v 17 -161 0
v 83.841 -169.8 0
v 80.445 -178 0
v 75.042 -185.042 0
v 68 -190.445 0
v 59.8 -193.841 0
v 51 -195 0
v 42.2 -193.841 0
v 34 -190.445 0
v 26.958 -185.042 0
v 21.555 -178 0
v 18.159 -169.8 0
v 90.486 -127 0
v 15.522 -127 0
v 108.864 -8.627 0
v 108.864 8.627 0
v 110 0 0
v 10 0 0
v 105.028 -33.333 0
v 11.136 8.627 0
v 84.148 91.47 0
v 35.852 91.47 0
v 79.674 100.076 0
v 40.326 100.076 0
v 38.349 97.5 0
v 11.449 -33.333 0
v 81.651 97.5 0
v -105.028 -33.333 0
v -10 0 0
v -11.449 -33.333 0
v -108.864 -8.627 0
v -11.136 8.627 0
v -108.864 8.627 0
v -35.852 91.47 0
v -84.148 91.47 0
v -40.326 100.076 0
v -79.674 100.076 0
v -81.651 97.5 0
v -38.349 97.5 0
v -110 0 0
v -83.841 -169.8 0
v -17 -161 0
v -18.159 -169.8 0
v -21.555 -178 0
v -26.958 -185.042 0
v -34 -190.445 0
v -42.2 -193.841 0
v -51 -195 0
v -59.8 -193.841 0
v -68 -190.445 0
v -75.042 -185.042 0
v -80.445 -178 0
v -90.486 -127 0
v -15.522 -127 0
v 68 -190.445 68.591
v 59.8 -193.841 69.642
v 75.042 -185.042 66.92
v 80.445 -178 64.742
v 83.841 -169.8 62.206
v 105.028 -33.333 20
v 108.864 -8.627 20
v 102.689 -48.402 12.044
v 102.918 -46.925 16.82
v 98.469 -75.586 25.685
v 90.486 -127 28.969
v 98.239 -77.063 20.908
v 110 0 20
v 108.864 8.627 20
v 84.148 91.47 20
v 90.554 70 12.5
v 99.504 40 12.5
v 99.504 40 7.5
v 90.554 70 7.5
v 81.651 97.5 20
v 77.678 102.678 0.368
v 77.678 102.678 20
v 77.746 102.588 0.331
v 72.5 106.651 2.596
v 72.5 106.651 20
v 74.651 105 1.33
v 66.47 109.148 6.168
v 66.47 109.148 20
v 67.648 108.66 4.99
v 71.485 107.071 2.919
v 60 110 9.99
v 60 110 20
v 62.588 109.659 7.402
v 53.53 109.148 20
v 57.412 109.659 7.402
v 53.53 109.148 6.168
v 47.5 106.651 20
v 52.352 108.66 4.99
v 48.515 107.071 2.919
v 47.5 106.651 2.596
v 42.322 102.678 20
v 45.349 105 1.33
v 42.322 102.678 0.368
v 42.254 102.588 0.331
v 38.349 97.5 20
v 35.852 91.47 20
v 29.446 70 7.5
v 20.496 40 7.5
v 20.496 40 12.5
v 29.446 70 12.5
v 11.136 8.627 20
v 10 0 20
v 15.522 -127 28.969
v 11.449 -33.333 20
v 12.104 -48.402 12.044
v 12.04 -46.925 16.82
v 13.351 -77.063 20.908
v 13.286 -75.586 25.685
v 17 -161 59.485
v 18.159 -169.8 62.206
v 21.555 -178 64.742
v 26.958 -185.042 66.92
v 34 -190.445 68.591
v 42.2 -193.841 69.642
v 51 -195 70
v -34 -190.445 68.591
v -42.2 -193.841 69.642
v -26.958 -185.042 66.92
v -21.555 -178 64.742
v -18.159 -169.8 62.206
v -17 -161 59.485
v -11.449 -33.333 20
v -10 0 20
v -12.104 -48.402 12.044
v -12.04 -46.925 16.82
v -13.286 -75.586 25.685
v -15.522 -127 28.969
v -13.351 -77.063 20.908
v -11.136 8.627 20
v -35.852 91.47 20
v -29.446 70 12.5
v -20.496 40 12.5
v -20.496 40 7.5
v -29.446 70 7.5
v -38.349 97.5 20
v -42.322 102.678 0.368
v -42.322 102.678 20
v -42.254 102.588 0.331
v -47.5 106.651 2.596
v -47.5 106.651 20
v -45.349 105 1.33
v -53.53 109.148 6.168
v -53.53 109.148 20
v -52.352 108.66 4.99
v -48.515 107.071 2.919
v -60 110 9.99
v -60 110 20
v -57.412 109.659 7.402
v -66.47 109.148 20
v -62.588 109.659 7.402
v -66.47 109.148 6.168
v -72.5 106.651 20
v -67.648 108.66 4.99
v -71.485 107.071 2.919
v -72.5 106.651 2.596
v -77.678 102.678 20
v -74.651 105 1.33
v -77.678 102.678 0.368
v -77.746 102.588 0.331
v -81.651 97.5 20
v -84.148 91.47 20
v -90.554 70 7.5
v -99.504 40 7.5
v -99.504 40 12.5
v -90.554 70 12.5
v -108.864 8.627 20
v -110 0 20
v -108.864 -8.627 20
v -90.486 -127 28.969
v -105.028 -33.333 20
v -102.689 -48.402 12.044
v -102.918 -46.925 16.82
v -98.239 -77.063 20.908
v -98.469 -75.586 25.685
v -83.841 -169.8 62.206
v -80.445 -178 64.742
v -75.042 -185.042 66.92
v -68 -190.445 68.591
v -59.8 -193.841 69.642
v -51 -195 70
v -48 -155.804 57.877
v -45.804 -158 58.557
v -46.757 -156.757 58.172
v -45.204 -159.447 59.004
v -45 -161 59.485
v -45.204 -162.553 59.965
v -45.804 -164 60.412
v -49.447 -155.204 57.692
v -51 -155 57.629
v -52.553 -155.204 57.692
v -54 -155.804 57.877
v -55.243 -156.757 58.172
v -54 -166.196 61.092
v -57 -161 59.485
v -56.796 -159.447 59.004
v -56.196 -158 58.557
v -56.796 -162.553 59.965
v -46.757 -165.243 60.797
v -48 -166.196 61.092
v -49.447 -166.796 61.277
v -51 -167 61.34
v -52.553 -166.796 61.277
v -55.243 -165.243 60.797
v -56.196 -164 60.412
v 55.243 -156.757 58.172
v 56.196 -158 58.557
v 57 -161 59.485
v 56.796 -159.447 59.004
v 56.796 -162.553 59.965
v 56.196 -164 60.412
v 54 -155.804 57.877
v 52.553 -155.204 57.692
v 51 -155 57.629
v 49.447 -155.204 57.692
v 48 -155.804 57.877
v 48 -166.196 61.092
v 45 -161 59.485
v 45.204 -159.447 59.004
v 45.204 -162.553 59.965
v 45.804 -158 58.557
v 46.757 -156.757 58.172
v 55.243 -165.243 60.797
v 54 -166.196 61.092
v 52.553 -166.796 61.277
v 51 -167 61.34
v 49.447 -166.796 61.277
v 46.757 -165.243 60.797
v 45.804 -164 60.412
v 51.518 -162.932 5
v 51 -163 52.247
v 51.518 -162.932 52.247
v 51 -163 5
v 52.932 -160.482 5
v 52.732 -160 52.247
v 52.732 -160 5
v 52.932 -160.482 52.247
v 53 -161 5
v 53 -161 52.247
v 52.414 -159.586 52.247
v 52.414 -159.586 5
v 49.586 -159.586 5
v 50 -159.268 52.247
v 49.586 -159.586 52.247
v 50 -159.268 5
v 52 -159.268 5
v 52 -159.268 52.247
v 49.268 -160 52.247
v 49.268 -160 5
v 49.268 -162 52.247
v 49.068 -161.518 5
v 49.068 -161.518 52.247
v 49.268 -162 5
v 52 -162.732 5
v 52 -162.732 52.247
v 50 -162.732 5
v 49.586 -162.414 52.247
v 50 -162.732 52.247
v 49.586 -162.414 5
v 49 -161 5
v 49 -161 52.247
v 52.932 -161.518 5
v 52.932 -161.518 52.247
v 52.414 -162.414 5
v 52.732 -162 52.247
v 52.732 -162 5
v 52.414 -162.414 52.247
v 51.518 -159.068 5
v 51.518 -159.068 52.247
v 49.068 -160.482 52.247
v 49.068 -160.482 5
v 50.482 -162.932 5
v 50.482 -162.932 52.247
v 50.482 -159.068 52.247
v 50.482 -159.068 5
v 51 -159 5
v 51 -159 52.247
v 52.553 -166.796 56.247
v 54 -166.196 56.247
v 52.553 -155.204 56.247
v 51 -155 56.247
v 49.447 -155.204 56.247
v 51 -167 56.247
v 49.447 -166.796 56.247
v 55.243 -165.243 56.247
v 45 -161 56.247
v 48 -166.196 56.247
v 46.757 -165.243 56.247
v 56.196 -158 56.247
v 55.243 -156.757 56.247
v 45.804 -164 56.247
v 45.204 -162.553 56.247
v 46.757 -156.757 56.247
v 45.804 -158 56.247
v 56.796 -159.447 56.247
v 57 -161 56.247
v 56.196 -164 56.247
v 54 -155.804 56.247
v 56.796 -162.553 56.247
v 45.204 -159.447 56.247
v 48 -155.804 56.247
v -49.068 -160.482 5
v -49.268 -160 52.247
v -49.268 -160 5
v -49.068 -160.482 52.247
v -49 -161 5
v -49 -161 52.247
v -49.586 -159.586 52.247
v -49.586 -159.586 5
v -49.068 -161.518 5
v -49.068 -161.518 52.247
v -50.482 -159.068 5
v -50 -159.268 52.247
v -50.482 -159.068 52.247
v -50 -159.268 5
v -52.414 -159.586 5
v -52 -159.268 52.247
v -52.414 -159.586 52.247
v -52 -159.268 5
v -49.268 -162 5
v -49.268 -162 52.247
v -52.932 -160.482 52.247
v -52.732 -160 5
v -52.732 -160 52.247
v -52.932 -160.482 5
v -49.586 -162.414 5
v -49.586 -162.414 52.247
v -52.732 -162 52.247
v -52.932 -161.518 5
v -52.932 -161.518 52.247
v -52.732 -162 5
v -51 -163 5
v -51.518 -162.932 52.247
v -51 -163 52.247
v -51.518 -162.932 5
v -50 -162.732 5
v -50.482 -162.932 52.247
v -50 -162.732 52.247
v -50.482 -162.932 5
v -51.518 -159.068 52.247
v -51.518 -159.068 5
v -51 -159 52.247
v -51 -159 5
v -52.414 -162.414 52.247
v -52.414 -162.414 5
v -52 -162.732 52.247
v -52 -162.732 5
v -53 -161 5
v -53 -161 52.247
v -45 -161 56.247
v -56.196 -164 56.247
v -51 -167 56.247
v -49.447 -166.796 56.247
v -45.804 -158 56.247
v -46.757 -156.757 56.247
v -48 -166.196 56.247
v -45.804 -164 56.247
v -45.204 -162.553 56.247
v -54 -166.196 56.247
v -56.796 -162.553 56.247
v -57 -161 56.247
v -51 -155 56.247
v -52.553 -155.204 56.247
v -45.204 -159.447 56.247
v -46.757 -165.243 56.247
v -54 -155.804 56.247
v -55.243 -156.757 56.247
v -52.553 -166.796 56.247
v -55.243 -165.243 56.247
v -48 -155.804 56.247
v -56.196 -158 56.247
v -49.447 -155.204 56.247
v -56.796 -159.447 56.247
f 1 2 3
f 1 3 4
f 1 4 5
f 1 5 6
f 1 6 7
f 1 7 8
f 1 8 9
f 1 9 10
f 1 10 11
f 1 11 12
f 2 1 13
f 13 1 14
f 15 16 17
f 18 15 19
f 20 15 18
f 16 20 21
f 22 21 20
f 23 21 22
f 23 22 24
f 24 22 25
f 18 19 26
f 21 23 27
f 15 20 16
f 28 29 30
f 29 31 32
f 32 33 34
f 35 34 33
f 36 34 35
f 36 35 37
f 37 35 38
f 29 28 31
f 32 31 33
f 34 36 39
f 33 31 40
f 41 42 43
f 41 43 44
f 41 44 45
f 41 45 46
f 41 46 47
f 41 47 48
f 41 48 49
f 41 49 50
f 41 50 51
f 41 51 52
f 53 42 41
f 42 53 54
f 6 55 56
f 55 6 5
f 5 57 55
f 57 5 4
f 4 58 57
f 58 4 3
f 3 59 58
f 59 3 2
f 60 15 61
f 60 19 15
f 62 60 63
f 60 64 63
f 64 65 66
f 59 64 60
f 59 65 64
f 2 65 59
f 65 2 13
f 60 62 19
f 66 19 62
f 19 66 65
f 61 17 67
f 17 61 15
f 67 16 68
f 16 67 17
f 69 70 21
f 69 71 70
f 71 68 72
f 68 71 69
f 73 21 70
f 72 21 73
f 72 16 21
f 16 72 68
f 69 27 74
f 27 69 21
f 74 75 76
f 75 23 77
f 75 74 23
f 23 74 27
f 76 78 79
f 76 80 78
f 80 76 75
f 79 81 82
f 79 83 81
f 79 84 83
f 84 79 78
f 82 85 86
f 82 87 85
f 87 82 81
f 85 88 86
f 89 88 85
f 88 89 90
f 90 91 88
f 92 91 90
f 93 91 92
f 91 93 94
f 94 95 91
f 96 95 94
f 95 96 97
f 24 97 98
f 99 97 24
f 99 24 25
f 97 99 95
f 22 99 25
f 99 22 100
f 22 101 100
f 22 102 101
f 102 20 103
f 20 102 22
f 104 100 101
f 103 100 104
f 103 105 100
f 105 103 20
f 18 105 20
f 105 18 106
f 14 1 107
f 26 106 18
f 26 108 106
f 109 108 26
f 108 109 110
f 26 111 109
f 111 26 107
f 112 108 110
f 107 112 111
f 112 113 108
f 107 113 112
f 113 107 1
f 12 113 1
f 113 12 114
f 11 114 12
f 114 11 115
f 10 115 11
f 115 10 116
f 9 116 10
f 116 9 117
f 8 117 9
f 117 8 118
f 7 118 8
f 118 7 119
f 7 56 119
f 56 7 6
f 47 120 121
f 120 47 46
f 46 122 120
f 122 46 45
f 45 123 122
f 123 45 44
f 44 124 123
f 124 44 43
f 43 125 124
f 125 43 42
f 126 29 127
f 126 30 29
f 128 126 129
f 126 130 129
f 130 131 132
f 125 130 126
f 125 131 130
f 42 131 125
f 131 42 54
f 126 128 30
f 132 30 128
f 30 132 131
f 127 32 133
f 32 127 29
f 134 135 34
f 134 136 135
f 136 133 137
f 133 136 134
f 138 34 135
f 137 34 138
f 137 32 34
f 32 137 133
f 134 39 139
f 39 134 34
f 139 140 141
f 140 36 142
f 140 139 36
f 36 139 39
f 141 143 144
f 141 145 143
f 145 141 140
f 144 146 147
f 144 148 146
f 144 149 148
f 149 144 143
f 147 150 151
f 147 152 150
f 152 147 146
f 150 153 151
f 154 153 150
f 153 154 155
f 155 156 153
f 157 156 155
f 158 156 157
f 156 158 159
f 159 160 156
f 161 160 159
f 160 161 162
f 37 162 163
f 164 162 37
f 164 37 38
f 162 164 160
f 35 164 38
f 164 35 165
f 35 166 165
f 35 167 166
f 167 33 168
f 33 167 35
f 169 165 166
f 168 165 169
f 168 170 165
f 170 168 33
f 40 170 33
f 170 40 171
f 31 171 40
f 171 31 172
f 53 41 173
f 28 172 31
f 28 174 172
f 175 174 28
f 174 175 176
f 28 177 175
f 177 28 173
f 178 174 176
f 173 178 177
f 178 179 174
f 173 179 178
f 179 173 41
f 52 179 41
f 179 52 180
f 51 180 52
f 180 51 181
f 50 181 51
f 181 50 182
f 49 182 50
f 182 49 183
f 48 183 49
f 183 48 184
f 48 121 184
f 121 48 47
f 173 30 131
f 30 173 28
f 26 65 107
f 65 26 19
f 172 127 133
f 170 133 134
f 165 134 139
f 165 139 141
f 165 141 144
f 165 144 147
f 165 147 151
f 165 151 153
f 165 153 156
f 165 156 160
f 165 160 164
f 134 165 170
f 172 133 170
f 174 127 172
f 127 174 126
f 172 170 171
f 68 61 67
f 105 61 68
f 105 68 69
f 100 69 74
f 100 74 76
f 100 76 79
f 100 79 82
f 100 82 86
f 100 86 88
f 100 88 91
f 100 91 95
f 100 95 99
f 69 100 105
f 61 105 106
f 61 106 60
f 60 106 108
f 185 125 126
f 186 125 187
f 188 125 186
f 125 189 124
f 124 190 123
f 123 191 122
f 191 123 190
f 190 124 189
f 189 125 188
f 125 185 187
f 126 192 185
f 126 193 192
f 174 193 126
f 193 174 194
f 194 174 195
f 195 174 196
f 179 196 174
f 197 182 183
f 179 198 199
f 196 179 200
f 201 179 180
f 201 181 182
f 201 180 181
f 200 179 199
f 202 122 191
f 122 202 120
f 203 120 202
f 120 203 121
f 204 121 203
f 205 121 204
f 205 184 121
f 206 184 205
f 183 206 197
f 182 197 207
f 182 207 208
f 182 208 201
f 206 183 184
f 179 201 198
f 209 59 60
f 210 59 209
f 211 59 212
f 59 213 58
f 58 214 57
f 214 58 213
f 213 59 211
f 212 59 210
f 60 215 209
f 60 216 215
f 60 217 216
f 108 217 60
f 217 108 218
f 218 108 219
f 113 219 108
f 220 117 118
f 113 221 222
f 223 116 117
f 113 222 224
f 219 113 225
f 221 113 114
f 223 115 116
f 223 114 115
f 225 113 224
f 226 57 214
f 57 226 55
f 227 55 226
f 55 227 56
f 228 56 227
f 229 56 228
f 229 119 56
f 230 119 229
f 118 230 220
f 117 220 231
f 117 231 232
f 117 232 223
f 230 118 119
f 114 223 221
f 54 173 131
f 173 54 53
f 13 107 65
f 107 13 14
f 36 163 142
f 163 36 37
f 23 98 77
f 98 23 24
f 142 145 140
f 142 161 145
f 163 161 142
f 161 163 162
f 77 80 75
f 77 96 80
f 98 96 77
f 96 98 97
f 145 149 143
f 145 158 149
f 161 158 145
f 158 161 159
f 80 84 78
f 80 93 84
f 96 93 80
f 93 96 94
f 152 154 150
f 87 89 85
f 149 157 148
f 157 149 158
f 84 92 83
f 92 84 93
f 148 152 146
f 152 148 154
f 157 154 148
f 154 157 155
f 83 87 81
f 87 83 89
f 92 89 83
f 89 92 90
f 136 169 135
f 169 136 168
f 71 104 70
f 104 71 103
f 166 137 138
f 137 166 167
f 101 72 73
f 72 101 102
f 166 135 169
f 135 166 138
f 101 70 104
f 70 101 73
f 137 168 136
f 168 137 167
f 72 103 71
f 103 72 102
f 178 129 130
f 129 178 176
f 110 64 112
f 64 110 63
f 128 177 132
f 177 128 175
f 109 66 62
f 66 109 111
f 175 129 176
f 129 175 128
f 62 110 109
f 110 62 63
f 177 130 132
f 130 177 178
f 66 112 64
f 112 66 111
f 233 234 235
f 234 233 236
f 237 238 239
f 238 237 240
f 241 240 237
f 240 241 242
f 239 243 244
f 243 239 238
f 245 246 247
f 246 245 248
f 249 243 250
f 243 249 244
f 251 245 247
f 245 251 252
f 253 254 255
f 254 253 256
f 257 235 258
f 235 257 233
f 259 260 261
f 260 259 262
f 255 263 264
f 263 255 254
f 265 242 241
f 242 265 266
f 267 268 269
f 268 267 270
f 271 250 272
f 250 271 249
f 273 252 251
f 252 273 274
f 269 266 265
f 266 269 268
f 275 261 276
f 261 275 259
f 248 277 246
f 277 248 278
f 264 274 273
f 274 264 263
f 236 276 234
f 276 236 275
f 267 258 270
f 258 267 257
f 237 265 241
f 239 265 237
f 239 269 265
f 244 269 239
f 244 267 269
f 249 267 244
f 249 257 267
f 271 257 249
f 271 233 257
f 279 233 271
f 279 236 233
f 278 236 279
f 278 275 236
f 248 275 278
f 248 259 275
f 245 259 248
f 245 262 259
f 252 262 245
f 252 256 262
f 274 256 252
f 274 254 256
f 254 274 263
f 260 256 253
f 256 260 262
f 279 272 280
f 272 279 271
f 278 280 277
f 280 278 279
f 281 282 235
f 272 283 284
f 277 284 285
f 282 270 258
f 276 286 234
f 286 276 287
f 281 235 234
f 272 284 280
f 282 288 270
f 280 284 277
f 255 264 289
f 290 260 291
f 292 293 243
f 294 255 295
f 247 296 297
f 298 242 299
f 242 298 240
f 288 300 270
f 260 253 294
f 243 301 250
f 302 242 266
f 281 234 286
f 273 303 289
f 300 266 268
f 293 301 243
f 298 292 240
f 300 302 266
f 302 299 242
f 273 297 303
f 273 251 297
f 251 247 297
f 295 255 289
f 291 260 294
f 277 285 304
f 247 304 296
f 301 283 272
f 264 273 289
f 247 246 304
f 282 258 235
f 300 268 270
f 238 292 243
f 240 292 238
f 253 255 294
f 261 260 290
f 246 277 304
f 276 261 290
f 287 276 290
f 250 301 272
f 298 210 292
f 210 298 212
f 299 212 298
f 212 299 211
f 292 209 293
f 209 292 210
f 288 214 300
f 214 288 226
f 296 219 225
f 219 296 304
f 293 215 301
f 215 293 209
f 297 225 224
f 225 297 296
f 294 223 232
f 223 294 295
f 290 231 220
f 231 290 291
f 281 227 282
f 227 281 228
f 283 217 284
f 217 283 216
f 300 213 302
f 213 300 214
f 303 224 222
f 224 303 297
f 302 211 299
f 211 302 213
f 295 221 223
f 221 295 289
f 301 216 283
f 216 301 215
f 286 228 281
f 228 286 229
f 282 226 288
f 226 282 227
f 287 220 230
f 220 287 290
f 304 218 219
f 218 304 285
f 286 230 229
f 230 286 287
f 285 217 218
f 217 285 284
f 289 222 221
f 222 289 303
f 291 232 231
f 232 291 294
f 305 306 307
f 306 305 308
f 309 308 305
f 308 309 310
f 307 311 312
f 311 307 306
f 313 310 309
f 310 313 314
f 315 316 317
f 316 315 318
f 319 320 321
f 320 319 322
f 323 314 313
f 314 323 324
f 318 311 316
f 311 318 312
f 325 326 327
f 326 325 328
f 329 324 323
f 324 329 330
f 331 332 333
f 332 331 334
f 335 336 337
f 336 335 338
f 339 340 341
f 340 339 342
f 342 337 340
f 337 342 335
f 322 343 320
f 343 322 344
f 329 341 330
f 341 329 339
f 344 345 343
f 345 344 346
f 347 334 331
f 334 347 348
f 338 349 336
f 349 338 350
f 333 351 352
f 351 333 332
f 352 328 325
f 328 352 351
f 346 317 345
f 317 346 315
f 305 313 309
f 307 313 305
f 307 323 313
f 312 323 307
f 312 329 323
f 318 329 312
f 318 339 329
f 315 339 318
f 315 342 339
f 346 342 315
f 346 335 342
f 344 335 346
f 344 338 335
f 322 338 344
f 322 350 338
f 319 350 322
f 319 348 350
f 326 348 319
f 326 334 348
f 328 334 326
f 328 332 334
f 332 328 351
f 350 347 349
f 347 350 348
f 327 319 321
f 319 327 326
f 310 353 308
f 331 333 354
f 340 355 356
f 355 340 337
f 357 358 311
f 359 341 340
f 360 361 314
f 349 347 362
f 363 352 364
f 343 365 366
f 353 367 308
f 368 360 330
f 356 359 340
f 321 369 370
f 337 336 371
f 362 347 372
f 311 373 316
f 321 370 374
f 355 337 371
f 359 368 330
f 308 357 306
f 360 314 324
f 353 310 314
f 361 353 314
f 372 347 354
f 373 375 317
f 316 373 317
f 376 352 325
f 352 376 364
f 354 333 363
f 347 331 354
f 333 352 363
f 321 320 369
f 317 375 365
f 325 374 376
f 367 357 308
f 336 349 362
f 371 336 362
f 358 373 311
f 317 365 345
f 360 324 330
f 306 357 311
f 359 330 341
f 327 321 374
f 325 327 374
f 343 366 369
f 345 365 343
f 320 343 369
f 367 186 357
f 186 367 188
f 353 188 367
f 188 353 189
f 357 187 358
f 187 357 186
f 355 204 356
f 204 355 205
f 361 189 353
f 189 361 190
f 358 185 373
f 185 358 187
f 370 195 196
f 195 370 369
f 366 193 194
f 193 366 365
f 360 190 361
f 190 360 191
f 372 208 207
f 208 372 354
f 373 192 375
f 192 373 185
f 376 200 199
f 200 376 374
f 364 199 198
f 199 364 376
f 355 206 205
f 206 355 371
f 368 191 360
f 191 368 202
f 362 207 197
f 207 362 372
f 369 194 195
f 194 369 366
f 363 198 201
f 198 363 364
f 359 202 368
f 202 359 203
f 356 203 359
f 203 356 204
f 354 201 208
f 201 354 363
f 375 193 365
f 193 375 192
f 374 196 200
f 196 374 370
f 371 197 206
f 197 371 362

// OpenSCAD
//Name: Shoe
//Created by Ari M. Diacou, April 2015
//Shared under Creative Commons License: Attribution-ShareAlike 3.0 Unported (CC BY-SA 3.0) 
//see http://creativecommons.org/licenses/by-sa/3.0/
//v1.1 had 153 downloads.
//v1.2 had 68 downloads: Fixed customizer errors (options need to be in quotes in declaration, commented options are not in quotes), removed some extraneous code.
//v1.3 Changed sides_radius to derived parameter, put in more reaonable inputs after my own size 46 foot, started to add code that doesnt work for a heel cup, fixed an alignment bug in tip bevel, added countersinks to the heel screw holes.

/* [Dimensions] */
//The length along the ground of the shoe (in mm)
length_of_shoe=280;
//Corresponding to the ball of your foot to the bulge below your pinky toe
widest_width=100;
//The widest dimension of the heel of your shoe
heel_width=68;
//The distance between the line travesing the widest part of your foot, and the tip of the shoe
widest_width_to_tip=85;
//A shape adjustment parameter, which pulls the heel towards the inside of the foot relative to the ceterline of the shoe.
heel_proximal_offset=25;
//The radius of the curve of the tip of the shoe
tip_radius=25;
//The distance from the heel of your foot to the ground
heel_height=70;
//The distance from your toes to the ground
sole_thickness=20;
//The height that the heelcup will rise abve the bottome of your heel
heel_cup_height=1;
//The maximum thickness of the heelcup
heel_cup_thickness=.4;


/* [Options] */
//Heel creates a heeled shoe with a gap in the middle, Wedge shoes contact the floor throughout the length, Soles Only is used to make 2D dxf files (maybe you want to laser-cut something?
type="heel";//[heel,wedge,soles_only]
//Adds a curved edge to the tips of the shoes
user_wants_beveled_tips="yes";//[yes,no]
//Adds horozontal through holes for attaching straps
these_are_sandals="yes";//[yes,no]
//Adds a vertical shaft in the heel for drilling a screw into. The author hypothizized that it would be less likely that the filament layers would shear apart if there were a metal screw in the heel, making these safer.
user_wants_heel_screws="yes";//[yes,no]
//The width of the strap holes
strap_width=30;
//The thickness of the holes that the straps will be slid through
strap_thickness=5;
//The diameter of the hole for the heel screws
screw_hole_diameter=4;
//How many flat segments make a circle for the rest of this program? ($fn=curviness)
curviness=24;
/* [Hidden] */
///// Derived Scalars /////
$fn=curviness;
ep=.01+0;
displacement=[(1/2+.1)*widest_width,0,0]; //how far to move the shoes apart, also a natural unit in x
tip=[0,+widest_width_to_tip]; //the location of the tip circle
sides_radius=widest_width/3; //The radius of the curve of the sides of the shoe (near the ball of the foot) (used to be inputable, but a pain in the ass, and doesnt adjust shape much. If sides_radius*2 >= widest_width, then hull() wont work.
inside=[-max(widest_width/2-sides_radius,0),0]; //location of the inside (ball of foot) circle
outside=[max(widest_width/2-sides_radius,0),0]; //location of the outside circle
heel=[widest_width/2-heel_width/2-heel_proximal_offset,-(length_of_shoe-widest_width_to_tip-heel_width/2)]; //location of the heel circle
rotation = 0.5*atan((outside[0]-heel[0])/(heel[1]-outside[1]))+0.5*atan((inside[0]-heel[0])/(heel[1]-inside[1])); echo(str("rotation= ",rotation)); //how much do you have to rotate the shoes to make them look like a pair out of the box. Takes the average of the inside and oustide slopes. Aesthetic only.
real_heel_height=heel_height>sole_thickness?heel_height:sole_thickness; //if the heel height is less than the sole thickness, just use the sole thickness
slope = (real_heel_height - sole_thickness) / (heel[1]-heel_width/2+sides_radius);//Used to calculate how high to make the indent of the heel
heel_angle=atan(slope); echo(str("heel angle = ",heel_angle));
///////// MAIN() //////
if(type!="soles_only") 
    difference(){
        shoes();
        if(user_wants_beveled_tips=="yes"){tip_bevel();}
        if(these_are_sandals=="yes"){strap_holes();}
        if(user_wants_heel_screws=="yes"){screw_holes2();}
        }
if(type=="soles_only"){
    translate(displacement) rotate(-rotation) right_foot();
    translate(-displacement) rotate(rotation) left_foot();
    }    
////// FUNCTIONS //////
module screw_hole(){
    //Right shoe
    translate([displacement[0]+heel[0],heel[1],sole_thickness/4]) 
        cylinder(h=real_heel_height,r=screw_hole_diameter/2);
    //Left Shoe
    translate([-displacement[0]-heel[0],heel[1],sole_thickness/4]) 
        cylinder(h=real_heel_height,r=screw_hole_diameter/2);
    }
module screw_holes2(){ //now with countersinks  
    countersink_height=real_heel_height+1*.5*heel_width*slope-(1-slope)*screw_hole_diameter;
    bottom = sole_thickness/4;
    counterbore_height=screw_hole_diameter*(1+abs(slope));
    x_translation=displacement[0]+heel[0];
    //Right shoe
    //screw shaft
    translate([x_translation,heel[1],sole_thickness/4]) 
        cylinder(h=countersink_height-bottom,r=screw_hole_diameter/2);
    //countersink
    translate([x_translation,heel[1],countersink_height-screw_hole_diameter/2]) 
        cylinder(h=screw_hole_diameter,d1=screw_hole_diameter,d2=3*screw_hole_diameter);
    //counterbore
    translate([x_translation,heel[1],countersink_height+screw_hole_diameter/2]) 
        cylinder(h=counterbore_height,d=3*screw_hole_diameter);
    
    //Left Shoe
    //screw shaft
    translate([-x_translation,heel[1],sole_thickness/4]) 
        cylinder(h=countersink_height-bottom,r=screw_hole_diameter/2);
    //countersink
    translate([-x_translation,heel[1],countersink_height-screw_hole_diameter/2]) 
        cylinder(h=screw_hole_diameter,d1=screw_hole_diameter,d2=3*screw_hole_diameter);
    //counterbore
    translate([-x_translation,heel[1],countersink_height+screw_hole_diameter/2]) 
        cylinder(h=counterbore_height,d=3*screw_hole_diameter);
    }
module strap_holes(){
    translate([0,(widest_width_to_tip+tip_radius)/2,.5*sole_thickness])
        cube([4*displacement[0],strap_width,strap_thickness],center=true);
   translate([0,(-sides_radius-strap_width*cos(heel_angle)),.5*sole_thickness-strap_width*sin(heel_angle)])
    rotate([heel_angle,0,0])
        cube([4*displacement[0],strap_width,strap_thickness],center=true);
}
module tip_bevel(){
    translate([-2*displacement[0],tip[1]+tip_radius-sole_thickness/2,sole_thickness/2-ep]) rotate([0,90,0])
//    difference(){
    difference(){
        cube([sole_thickness/2,sole_thickness/2,4*displacement[0]]);
        cylinder(h=4*displacement[0]+ep,r=sole_thickness/2);
        }
    }
module shoes(){
    //The shoes are created by extruding each 2D sole up to the heel height, and then intersecting that with the yz_profile of the shoe
    intersection(){
        linear_extrude(height=real_heel_height){
            translate(displacement) right_foot();
            translate(-displacement) left_foot();
            }
        translate(-2*displacement) 
            rotate([90,0,90]) 
                linear_extrude(height=4*displacement[0])
                    yz_profile();
        }          
    } 
module yz_profile(){
    //When looking at the shoes with the tip facing right, and the heel laying on the "ground" (y pointing right, z pointing up) the points start from the [tip,floor] and proceed clockwise to define the points which make up the profile of the shoe.
    points = [ //pairs are in [y,z] format
        [tip[1]+tip_radius,0], //[tip,floor]
        [-sides_radius,0], //place where shoe starts rising put conservatively far back over fears of the shoe breaking
        [heel[1]+heel_width/2,(type=="heel")?slope*(heel[1]+heel_width/2+sides_radius):0], //the indent of the heel, if wedge shoe, set height to zero
        [heel[1]+heel_width/2,0], //the front part of the heel
        [heel[1]-heel_width/2,0], //the back of the heel
        [heel[1]-heel_width/2,real_heel_height], //5 the top of the heel
        [-sides_radius,sole_thickness],//6 where the ball of the foot should go
        [tip[1]+tip_radius,sole_thickness] //[tip,sole]
        ];    
    *for(i=[0:len(points)-1]){ //Making points visble for debugging
        color("yellow") translate(points[i]) circle(r=.1); 
        echo(points[i]);
        }
    color("lightgreen") polygon(points); // A polygon is created from the listed points. It will then be rotated from the natural xy format of 2D shapes in openscad, to the yz plane, and then extruded to cut the side profile of the shoes
    }
module right_foot(){
    //Creates a 2D outline of the right foot. The sole of the foot is made by wrapping a string/hull around 4 circles. One around the heel, one around the ball of the foot, one near the pinky toe, and one near the toes. Shoe shape is adjusted by adjusting the position and size of these circles.
    hull(){
        translate(tip) 
            circle(tip_radius);//tip
        if(sides_radius*2<widest_width){//If you choose a sides radius that is too big the program will simply use a single circle with diameter = the width of the shoe. Used to control input error.
            translate(outside) 
                circle(sides_radius); //outside side
        translate(inside) 
            circle(sides_radius); //inside side
        }
        if(sides_radius*2>widest_width){ //same input check as above
            circle(sides_radius);
            }
        translate(heel) //the heel
            circle(heel_width/2);
        }
    }
module left_foot(){
    //The left foot is just the right foot mirrored along the yz plane. 
    mirror([1,0,0]) right_foot();
    }
    
module heel_cup(){
    difference(){
        linear_extrude(height=real_heel_height){ //extrude the soles again
            translate(displacement) right_foot();
            translate(-displacement) left_foot();
            }
        heel_yz_removal();
        heel_xy_removal();
        }        
    }
module heel_yz_removal(){
    translate([-2.5*displacement[0],heel[1],real_heel_height*-0.1]) 
        cube([5*displacement[0],length_of_shoe,real_heel_height*1.2]);
    }
module heel_xy_removal(){ //Doesn't work yet
    //Substracts an extruded ellipse from the heel. The ellipse has the same width as the circle used to make the heel, but is shortened in the length direction. This allows the heel cup to go from a maximum thickness by the achilles tendon, to a minimum at the ankle bone.
    ellipse_eccentricity=(heel_width-2*heel_cup_thickness)/heel_width; //The ellipse is a scaled circle. The scaling factor is chosen to shorten the ellipse by the "heel_cup_thickness" selected in parameters.
    x=heel[0]+displacement[0]; //the x placement of the elliipses
    y=heel[1]; //the y placement of the elliipses

    //Right foot
    linear_extrude(height=real_heel_height)
        translate([x,y])
            scale([1,ellipse_eccentricity,1])
                circle(r=heel_width/2);
    //Left foot
    linear_extrude(height=real_heel_height)
        translate([-x,y])
            scale([1,ellipse_eccentricity,1])
                circle(r=heel_width/2);
    }
